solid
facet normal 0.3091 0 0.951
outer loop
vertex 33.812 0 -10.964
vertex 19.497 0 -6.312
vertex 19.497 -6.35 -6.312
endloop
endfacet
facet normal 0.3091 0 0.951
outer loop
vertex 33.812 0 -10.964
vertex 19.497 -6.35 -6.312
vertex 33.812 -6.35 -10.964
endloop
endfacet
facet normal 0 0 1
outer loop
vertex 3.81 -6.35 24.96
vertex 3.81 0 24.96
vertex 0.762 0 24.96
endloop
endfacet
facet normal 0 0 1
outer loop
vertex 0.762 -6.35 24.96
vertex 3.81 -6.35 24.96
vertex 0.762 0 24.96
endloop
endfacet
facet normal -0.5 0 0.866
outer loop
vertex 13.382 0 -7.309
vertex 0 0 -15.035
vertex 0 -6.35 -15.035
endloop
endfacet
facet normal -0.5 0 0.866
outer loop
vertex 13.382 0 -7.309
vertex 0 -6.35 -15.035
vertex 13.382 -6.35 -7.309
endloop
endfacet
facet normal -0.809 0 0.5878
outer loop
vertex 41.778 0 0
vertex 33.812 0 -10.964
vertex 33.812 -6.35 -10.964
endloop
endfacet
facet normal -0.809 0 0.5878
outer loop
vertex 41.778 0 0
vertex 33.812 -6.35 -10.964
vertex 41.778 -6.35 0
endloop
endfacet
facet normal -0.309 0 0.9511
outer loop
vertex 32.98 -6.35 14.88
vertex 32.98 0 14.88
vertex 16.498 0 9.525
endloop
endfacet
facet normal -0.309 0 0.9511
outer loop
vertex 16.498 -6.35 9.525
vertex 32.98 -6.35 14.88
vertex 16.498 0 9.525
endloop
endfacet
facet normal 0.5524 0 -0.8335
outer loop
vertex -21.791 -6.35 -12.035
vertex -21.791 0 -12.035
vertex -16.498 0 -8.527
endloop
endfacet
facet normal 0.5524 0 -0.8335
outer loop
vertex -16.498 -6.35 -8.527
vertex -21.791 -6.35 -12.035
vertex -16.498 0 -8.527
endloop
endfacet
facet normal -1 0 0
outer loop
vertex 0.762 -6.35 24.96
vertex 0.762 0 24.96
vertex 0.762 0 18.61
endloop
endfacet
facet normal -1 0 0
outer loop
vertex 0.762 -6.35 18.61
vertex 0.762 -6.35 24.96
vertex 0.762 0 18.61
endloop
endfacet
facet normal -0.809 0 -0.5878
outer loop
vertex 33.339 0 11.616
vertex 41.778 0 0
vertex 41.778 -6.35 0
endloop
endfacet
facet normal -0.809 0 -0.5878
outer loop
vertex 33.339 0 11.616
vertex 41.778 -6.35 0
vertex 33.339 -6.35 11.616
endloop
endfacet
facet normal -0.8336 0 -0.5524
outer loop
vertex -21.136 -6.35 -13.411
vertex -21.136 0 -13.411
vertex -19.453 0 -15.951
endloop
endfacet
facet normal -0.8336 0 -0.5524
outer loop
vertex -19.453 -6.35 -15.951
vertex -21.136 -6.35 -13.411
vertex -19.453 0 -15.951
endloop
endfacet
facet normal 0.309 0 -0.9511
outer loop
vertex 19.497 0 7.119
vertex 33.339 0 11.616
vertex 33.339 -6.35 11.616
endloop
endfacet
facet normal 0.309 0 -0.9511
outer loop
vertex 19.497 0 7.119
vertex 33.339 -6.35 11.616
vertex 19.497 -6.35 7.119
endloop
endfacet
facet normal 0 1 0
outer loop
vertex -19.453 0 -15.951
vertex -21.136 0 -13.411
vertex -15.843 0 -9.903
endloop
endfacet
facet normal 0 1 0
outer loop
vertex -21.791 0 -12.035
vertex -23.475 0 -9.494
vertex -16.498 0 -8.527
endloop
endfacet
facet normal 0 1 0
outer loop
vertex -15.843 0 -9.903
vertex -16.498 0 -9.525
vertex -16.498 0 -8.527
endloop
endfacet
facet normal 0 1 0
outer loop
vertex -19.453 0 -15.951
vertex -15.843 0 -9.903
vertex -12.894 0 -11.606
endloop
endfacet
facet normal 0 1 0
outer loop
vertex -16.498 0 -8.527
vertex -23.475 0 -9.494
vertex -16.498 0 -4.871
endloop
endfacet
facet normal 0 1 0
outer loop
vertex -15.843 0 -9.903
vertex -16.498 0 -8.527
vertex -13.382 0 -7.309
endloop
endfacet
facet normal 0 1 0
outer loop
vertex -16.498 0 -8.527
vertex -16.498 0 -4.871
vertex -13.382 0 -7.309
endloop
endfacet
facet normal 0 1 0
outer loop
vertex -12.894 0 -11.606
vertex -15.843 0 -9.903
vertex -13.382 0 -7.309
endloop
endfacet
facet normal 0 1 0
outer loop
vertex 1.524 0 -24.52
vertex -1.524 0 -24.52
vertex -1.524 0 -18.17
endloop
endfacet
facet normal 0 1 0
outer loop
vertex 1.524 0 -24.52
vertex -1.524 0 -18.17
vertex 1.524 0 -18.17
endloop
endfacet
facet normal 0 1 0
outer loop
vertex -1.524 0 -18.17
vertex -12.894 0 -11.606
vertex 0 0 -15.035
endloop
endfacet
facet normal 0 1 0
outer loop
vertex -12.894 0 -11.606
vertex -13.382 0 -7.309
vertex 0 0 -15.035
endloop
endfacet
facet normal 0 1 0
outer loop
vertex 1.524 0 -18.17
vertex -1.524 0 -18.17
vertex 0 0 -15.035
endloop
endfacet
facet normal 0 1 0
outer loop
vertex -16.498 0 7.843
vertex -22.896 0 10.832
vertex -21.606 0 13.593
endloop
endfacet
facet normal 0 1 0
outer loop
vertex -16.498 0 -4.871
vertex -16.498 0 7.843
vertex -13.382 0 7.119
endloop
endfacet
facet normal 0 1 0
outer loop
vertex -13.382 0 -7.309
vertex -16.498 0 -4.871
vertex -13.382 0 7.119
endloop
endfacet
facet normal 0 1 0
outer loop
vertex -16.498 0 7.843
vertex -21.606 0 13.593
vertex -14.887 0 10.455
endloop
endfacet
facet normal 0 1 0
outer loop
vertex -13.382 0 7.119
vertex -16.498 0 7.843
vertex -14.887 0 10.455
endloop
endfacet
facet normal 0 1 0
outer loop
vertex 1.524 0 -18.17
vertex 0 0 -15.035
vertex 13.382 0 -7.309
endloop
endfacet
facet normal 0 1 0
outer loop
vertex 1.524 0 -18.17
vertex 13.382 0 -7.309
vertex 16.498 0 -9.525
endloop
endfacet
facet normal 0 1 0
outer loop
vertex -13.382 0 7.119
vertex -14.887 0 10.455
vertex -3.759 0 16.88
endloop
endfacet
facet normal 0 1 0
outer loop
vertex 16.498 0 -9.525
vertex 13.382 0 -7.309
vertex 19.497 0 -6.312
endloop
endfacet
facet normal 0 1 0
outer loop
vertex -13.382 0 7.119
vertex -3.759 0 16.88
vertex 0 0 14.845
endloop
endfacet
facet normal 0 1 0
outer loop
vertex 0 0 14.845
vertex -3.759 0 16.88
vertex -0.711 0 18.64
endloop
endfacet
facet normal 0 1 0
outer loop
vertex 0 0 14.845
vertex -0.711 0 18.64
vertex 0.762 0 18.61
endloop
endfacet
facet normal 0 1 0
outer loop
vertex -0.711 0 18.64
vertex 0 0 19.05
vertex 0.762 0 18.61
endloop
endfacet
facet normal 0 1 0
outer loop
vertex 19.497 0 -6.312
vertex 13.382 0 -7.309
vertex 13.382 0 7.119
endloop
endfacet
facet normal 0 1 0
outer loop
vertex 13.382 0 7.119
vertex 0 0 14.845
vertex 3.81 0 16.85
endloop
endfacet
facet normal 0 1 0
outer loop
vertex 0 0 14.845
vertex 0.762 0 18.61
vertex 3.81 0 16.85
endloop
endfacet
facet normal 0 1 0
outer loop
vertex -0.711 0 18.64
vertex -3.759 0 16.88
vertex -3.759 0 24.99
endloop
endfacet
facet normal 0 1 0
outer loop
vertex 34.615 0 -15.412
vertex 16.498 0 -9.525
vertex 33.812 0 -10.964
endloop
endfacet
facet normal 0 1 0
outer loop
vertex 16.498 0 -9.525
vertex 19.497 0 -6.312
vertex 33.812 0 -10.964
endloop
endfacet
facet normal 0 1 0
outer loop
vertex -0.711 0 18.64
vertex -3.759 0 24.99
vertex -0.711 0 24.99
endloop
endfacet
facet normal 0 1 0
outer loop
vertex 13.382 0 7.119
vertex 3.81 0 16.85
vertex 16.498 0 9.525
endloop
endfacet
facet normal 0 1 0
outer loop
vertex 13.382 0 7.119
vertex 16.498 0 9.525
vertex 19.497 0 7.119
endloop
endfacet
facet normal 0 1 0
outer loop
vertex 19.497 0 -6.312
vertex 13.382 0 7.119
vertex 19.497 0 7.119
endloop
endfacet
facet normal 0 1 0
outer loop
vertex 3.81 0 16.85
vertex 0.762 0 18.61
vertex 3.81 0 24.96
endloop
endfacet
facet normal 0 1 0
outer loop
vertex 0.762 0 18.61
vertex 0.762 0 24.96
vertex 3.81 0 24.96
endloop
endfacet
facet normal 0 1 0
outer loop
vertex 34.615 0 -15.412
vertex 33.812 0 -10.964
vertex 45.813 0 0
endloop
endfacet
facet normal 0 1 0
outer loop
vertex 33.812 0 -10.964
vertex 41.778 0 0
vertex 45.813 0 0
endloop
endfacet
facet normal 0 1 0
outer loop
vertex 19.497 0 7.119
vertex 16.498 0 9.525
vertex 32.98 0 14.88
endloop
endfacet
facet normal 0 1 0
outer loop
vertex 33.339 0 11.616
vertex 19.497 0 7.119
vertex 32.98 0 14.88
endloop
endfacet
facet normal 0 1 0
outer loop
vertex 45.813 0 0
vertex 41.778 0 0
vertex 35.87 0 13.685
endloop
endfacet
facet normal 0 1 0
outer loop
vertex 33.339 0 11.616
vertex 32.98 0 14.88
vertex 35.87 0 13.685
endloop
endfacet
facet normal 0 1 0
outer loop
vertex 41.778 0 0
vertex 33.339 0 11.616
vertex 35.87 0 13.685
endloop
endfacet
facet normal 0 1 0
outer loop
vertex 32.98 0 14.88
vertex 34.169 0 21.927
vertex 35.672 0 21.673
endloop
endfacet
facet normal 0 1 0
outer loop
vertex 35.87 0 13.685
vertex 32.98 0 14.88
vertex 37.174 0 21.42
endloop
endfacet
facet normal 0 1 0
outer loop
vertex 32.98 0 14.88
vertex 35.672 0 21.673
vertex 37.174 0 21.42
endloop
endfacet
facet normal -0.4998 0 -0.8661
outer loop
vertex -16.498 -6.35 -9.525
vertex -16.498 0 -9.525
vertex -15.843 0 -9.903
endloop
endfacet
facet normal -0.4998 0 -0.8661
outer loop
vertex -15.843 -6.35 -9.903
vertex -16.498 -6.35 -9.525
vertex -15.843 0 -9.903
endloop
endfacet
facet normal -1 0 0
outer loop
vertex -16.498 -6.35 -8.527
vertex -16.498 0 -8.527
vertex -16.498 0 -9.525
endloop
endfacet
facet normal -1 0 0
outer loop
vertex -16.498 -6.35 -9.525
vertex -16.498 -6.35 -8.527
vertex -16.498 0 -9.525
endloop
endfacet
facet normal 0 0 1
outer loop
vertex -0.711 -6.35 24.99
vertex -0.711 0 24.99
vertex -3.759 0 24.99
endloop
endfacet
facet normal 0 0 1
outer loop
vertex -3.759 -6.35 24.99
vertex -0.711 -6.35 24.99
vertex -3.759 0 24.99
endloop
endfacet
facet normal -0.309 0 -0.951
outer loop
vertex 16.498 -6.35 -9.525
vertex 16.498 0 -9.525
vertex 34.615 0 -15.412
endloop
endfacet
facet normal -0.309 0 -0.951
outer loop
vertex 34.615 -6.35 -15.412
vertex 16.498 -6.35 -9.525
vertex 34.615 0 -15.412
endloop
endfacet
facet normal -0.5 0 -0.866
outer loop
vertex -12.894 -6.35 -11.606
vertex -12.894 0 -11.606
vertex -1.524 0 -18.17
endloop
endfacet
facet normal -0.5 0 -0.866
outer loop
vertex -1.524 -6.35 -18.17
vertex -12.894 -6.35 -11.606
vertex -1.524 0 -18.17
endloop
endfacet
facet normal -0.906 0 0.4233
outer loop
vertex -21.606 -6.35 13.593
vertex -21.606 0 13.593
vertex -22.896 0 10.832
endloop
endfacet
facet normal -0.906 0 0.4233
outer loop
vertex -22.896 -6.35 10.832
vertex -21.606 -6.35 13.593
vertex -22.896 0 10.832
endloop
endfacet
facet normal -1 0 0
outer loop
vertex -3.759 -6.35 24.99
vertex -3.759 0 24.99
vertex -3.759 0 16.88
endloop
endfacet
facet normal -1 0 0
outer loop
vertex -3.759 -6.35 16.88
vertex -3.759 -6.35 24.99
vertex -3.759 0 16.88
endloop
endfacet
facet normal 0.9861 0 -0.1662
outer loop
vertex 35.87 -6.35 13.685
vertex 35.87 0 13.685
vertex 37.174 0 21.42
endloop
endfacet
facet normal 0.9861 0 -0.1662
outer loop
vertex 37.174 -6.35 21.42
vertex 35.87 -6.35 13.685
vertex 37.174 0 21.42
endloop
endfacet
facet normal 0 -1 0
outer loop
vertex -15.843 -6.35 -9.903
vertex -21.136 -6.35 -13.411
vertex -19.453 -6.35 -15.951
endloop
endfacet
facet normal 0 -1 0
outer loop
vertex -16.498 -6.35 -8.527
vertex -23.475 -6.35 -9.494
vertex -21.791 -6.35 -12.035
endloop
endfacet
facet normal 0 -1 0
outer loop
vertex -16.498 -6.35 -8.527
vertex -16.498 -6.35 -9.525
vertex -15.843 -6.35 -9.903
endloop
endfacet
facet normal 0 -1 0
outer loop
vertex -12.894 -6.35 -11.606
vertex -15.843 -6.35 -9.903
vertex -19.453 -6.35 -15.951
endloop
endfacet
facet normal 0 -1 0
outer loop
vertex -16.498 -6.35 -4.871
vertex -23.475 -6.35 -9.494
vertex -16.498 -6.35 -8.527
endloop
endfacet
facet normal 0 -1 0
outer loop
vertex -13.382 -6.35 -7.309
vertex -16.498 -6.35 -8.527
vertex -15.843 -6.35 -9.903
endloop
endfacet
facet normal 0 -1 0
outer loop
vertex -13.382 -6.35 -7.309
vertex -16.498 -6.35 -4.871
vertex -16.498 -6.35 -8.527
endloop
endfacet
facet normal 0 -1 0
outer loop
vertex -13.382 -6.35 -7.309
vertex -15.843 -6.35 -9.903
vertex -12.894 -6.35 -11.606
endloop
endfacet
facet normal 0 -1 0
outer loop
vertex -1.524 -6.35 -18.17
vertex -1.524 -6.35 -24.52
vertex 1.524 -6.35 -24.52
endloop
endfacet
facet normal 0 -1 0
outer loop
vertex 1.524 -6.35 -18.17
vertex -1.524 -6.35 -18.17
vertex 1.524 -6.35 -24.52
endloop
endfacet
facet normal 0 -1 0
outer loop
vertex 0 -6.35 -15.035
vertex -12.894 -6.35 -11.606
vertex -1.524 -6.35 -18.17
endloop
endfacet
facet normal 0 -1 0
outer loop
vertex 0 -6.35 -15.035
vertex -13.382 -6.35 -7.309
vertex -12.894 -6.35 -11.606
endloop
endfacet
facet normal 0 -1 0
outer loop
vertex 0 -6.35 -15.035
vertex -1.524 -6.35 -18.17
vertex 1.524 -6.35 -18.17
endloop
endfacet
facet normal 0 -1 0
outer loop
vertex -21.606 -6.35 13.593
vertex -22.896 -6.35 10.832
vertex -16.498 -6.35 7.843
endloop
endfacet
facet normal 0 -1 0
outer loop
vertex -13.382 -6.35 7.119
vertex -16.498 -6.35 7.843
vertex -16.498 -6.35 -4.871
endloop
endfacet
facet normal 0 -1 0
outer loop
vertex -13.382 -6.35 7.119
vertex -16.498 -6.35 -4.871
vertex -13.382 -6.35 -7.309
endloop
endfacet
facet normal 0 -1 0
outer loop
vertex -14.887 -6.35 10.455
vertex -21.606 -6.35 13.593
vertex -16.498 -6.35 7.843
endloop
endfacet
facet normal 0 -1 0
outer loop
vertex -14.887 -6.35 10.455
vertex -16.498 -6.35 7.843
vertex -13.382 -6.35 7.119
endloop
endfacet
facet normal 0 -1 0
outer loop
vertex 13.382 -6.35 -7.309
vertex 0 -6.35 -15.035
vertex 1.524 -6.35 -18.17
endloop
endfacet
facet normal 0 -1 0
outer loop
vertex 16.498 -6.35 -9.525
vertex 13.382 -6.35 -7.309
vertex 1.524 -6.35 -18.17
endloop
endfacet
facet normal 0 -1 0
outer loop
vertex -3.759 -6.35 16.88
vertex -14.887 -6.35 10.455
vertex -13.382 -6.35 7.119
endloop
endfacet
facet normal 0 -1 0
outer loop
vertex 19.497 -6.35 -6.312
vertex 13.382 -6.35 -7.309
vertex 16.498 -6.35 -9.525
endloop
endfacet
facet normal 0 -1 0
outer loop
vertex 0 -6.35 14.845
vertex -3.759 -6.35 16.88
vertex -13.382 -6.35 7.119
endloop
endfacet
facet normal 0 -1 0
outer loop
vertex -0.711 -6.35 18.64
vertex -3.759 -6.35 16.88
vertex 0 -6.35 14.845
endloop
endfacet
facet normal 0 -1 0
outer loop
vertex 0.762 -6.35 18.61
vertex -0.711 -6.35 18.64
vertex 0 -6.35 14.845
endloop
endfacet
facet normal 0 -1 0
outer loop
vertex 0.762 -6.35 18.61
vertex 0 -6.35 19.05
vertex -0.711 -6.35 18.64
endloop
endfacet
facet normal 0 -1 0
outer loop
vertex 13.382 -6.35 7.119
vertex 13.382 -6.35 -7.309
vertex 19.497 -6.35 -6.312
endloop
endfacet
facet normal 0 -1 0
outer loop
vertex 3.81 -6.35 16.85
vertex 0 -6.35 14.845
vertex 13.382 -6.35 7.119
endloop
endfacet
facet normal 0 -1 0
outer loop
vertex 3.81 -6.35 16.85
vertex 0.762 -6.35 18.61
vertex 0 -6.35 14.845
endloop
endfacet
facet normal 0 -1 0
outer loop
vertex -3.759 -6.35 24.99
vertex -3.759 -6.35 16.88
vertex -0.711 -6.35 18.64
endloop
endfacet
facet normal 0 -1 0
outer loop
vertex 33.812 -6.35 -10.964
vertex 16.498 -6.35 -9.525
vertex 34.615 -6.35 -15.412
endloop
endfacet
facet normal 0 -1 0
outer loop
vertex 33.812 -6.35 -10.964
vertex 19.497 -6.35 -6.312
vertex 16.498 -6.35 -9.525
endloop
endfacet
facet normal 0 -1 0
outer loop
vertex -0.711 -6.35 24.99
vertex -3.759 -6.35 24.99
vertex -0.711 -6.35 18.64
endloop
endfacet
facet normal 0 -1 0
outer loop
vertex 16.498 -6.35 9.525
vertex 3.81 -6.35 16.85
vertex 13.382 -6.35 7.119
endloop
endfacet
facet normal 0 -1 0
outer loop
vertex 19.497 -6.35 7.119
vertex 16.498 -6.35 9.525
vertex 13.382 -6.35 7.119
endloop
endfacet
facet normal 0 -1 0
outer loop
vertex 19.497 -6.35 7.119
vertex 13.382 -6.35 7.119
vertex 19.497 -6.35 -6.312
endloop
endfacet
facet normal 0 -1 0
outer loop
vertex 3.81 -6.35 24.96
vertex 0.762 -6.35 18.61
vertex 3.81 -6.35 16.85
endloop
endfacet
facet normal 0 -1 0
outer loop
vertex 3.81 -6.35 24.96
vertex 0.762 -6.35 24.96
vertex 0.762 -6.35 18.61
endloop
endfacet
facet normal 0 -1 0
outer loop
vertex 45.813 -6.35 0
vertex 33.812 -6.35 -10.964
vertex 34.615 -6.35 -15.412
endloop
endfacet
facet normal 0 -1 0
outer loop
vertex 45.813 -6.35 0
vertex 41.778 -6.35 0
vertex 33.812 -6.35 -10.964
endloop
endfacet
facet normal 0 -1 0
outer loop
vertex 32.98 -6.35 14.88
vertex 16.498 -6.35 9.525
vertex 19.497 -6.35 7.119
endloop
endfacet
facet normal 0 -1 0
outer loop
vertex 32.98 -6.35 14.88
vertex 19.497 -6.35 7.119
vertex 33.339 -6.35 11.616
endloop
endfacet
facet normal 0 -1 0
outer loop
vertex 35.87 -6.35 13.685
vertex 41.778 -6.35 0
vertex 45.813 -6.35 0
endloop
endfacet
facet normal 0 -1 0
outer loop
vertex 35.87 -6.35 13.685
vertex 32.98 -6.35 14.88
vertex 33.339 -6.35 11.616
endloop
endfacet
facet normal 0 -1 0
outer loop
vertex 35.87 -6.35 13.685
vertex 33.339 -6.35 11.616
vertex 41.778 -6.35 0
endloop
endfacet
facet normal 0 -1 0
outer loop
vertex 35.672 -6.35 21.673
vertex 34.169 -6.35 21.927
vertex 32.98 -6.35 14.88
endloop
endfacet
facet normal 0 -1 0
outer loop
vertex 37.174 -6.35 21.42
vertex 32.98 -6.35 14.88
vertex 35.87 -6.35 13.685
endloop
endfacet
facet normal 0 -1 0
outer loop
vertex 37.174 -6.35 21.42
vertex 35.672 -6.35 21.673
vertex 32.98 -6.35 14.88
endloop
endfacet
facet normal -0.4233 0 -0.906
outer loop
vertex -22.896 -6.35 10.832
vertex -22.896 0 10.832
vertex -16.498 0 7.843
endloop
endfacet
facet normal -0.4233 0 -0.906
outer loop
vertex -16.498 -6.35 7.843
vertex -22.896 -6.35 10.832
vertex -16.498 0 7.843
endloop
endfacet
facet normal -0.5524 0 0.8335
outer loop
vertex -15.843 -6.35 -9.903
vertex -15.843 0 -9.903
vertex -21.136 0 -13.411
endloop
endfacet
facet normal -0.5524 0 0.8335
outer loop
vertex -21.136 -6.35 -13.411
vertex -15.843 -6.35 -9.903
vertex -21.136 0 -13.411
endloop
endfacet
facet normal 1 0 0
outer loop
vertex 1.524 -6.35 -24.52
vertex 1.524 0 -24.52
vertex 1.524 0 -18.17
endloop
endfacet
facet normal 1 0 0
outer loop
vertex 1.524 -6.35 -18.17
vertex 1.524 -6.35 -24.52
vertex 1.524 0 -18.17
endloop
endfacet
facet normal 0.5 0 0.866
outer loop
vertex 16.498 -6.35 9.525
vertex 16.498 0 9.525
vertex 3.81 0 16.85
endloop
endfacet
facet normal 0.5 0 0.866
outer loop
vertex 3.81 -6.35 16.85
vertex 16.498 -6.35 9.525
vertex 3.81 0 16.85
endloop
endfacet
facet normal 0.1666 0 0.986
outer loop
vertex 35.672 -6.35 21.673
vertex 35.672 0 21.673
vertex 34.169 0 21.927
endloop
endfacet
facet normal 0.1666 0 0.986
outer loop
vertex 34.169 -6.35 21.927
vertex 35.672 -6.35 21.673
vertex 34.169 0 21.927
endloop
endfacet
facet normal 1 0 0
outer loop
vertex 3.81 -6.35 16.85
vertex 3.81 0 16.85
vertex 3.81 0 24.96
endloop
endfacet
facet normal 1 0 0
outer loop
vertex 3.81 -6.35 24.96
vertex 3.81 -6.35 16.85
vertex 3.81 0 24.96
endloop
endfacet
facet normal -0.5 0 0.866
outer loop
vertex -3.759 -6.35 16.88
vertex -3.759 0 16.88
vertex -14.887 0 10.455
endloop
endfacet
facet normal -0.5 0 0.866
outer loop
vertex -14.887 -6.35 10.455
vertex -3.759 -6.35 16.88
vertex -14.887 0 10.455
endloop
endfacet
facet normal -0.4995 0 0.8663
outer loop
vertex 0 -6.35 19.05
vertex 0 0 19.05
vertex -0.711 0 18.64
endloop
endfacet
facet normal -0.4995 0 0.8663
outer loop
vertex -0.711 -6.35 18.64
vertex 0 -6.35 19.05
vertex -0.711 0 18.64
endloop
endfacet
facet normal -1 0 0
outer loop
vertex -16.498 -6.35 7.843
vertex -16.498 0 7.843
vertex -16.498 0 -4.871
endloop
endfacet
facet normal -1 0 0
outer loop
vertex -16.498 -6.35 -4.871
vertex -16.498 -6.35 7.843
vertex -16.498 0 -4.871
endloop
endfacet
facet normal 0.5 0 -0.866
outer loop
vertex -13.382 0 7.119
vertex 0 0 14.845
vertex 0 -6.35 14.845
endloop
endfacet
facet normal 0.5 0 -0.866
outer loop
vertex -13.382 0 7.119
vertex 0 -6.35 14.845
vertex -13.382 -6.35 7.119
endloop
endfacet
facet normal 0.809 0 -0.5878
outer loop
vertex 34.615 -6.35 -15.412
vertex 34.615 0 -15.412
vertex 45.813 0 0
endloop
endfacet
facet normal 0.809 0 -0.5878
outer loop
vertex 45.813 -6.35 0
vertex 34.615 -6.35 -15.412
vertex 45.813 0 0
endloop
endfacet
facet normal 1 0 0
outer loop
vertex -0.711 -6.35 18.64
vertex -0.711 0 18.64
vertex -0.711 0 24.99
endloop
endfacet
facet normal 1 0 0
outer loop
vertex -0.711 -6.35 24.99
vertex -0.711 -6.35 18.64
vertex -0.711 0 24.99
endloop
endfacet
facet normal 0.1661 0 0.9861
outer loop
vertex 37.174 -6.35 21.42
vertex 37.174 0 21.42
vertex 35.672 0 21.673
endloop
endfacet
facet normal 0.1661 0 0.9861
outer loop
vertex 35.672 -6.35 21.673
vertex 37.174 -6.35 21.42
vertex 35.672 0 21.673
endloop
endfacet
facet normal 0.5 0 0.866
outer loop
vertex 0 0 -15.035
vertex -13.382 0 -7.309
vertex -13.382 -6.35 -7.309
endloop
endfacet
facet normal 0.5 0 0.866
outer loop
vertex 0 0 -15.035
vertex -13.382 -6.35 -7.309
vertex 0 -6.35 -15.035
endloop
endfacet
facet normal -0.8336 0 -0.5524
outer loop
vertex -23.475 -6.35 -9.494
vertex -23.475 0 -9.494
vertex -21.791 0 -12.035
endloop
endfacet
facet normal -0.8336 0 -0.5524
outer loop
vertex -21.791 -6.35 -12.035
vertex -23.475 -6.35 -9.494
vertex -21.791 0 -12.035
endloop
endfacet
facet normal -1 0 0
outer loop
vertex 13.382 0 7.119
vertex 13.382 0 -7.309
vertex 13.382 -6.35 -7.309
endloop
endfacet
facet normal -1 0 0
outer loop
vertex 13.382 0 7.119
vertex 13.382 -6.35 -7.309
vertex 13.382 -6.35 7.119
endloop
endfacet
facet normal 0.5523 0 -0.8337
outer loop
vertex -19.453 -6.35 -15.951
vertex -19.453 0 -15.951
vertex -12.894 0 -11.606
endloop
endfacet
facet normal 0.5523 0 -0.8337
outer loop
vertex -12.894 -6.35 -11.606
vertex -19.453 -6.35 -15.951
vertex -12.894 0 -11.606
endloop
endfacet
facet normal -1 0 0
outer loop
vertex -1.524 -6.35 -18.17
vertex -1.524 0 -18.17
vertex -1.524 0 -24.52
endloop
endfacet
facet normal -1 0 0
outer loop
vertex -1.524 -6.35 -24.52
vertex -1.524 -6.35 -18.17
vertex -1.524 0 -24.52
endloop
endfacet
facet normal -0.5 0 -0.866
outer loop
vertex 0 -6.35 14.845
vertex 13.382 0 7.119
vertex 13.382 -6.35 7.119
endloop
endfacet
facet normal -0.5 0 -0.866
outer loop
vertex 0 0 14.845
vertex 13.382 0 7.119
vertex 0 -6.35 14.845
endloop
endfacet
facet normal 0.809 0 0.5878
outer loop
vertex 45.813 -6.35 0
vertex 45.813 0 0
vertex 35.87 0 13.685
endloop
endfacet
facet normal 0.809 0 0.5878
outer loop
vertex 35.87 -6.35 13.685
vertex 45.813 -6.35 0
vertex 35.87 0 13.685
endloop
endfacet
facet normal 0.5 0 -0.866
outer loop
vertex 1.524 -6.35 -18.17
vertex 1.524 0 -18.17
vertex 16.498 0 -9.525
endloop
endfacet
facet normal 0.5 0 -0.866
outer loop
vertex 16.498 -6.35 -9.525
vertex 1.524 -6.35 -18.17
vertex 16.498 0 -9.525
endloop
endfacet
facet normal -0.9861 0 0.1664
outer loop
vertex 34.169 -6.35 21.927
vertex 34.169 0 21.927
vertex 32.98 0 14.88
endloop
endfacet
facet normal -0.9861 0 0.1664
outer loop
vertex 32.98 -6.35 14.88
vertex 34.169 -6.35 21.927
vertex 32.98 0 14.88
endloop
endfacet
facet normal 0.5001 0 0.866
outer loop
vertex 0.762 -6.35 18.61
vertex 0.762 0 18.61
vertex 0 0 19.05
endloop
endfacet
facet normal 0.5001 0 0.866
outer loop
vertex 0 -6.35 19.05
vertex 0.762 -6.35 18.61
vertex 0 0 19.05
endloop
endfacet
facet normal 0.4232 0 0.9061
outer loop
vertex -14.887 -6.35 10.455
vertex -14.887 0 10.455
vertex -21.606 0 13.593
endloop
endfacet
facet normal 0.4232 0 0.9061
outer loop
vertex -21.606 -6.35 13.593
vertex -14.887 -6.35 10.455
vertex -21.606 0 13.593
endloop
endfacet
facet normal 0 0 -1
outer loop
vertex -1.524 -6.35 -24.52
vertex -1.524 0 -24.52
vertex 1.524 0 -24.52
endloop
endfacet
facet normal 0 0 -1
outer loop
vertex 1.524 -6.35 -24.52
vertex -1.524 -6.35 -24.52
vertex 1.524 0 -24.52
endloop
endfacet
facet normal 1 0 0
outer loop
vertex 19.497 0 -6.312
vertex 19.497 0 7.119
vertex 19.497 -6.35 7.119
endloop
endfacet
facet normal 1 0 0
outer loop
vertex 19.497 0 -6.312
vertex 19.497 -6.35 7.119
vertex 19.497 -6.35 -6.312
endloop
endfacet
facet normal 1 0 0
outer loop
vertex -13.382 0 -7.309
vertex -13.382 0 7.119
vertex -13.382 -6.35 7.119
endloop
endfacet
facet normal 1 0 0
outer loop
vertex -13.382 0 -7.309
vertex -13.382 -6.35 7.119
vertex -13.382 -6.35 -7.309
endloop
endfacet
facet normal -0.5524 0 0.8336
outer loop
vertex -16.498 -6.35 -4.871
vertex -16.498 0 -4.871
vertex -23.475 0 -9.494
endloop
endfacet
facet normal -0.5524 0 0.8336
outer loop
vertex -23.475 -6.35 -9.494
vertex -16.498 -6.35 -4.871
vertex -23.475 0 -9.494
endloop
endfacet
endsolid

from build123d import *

# Parameters (mm, degrees)
F1_DEPTH = 6.35
F3_DEPTH = 60.96


with BuildPart() as f1:
    # F0 (on Front) → F1 (new body)
    with BuildSketch(Plane.XZ):
        Polygon((0.762, 18.610059), (0, 19.05), (-0.710735, 18.639657), (-3.758735, 16.879893), (-14.88736, 10.454779), (-16.497784, 9.525), (-16.497784, 7.842908), (-16.497784, 0), (-16.497784, -4.870526), (-16.497784, -8.526968), (-16.497784, -9.525), (-15.84291, -9.903091), (-12.894138, -11.605566), (-1.524, -18.170118), (0, -19.05), (1.524, -18.170118), (16.497784, -9.525), (16.497784, 0), (16.497784, 9.525), (3.81, 16.850295), align=None)
        Polygon((0.762, 24.960059), (0.762, 18.610059), (3.81, 16.850295), (3.81, 24.960059), align=None)
        Polygon((-3.758735, 16.879893), (-0.710735, 18.639657), (-0.710735, 24.989657), (-3.758735, 24.989657), align=None)
        Polygon((32.980273, 14.880485), (16.497784, 9.525), (16.497784, 0), (16.497784, -9.525), (34.615411, -15.411774), (45.81272, 0), (35.869741, 13.685336), (34.615411, 15.411774), align=None)
        Polygon((-16.497784, 9.525), (-14.88736, 10.454779), (-21.605948, 13.593383), (-22.250976, 12.212617), (-22.896004, 10.831851), (-16.497784, 7.842908), align=None)
        Polygon((34.168763, 21.926801), (32.980273, 14.880485), (34.615411, 15.411774), (35.869741, 13.685336), (37.17431, 21.419861), (35.671536, 21.673331), align=None)
        Polygon((1.524, -24.520118), (1.524, -18.170118), (0, -19.05), (-1.524, -18.170118), (-1.524, -24.520118), (0, -24.520118), align=None)
        Polygon((-16.497784, -8.526968), (-16.497784, -4.870526), (-23.474759, -9.49373), (-21.791126, -12.034534), align=None)
        Polygon((-19.452621, -15.951463), (-12.894138, -11.605566), (-15.84291, -9.903091), (-21.136253, -13.410658), align=None)
    extrude(amount=F1_DEPTH)

    # F2 (on face) → F3 (cut)
    with BuildSketch(Plane.XZ):
        Polygon((13.382281, 7.118522), (0, 14.844785), (-13.382281, 7.118522), (-13.382281, -7.308772), (0, -15.035036), (13.382281, -7.308772), align=None)
        Polygon((19.496603, 7.118522), (19.496603, -6.312186), (33.812493, -10.9637), (41.778088, 0), (33.338541, 11.61604), align=None)
    extrude(amount=F3_DEPTH, mode=Mode.SUBTRACT)


solid = f1.part
